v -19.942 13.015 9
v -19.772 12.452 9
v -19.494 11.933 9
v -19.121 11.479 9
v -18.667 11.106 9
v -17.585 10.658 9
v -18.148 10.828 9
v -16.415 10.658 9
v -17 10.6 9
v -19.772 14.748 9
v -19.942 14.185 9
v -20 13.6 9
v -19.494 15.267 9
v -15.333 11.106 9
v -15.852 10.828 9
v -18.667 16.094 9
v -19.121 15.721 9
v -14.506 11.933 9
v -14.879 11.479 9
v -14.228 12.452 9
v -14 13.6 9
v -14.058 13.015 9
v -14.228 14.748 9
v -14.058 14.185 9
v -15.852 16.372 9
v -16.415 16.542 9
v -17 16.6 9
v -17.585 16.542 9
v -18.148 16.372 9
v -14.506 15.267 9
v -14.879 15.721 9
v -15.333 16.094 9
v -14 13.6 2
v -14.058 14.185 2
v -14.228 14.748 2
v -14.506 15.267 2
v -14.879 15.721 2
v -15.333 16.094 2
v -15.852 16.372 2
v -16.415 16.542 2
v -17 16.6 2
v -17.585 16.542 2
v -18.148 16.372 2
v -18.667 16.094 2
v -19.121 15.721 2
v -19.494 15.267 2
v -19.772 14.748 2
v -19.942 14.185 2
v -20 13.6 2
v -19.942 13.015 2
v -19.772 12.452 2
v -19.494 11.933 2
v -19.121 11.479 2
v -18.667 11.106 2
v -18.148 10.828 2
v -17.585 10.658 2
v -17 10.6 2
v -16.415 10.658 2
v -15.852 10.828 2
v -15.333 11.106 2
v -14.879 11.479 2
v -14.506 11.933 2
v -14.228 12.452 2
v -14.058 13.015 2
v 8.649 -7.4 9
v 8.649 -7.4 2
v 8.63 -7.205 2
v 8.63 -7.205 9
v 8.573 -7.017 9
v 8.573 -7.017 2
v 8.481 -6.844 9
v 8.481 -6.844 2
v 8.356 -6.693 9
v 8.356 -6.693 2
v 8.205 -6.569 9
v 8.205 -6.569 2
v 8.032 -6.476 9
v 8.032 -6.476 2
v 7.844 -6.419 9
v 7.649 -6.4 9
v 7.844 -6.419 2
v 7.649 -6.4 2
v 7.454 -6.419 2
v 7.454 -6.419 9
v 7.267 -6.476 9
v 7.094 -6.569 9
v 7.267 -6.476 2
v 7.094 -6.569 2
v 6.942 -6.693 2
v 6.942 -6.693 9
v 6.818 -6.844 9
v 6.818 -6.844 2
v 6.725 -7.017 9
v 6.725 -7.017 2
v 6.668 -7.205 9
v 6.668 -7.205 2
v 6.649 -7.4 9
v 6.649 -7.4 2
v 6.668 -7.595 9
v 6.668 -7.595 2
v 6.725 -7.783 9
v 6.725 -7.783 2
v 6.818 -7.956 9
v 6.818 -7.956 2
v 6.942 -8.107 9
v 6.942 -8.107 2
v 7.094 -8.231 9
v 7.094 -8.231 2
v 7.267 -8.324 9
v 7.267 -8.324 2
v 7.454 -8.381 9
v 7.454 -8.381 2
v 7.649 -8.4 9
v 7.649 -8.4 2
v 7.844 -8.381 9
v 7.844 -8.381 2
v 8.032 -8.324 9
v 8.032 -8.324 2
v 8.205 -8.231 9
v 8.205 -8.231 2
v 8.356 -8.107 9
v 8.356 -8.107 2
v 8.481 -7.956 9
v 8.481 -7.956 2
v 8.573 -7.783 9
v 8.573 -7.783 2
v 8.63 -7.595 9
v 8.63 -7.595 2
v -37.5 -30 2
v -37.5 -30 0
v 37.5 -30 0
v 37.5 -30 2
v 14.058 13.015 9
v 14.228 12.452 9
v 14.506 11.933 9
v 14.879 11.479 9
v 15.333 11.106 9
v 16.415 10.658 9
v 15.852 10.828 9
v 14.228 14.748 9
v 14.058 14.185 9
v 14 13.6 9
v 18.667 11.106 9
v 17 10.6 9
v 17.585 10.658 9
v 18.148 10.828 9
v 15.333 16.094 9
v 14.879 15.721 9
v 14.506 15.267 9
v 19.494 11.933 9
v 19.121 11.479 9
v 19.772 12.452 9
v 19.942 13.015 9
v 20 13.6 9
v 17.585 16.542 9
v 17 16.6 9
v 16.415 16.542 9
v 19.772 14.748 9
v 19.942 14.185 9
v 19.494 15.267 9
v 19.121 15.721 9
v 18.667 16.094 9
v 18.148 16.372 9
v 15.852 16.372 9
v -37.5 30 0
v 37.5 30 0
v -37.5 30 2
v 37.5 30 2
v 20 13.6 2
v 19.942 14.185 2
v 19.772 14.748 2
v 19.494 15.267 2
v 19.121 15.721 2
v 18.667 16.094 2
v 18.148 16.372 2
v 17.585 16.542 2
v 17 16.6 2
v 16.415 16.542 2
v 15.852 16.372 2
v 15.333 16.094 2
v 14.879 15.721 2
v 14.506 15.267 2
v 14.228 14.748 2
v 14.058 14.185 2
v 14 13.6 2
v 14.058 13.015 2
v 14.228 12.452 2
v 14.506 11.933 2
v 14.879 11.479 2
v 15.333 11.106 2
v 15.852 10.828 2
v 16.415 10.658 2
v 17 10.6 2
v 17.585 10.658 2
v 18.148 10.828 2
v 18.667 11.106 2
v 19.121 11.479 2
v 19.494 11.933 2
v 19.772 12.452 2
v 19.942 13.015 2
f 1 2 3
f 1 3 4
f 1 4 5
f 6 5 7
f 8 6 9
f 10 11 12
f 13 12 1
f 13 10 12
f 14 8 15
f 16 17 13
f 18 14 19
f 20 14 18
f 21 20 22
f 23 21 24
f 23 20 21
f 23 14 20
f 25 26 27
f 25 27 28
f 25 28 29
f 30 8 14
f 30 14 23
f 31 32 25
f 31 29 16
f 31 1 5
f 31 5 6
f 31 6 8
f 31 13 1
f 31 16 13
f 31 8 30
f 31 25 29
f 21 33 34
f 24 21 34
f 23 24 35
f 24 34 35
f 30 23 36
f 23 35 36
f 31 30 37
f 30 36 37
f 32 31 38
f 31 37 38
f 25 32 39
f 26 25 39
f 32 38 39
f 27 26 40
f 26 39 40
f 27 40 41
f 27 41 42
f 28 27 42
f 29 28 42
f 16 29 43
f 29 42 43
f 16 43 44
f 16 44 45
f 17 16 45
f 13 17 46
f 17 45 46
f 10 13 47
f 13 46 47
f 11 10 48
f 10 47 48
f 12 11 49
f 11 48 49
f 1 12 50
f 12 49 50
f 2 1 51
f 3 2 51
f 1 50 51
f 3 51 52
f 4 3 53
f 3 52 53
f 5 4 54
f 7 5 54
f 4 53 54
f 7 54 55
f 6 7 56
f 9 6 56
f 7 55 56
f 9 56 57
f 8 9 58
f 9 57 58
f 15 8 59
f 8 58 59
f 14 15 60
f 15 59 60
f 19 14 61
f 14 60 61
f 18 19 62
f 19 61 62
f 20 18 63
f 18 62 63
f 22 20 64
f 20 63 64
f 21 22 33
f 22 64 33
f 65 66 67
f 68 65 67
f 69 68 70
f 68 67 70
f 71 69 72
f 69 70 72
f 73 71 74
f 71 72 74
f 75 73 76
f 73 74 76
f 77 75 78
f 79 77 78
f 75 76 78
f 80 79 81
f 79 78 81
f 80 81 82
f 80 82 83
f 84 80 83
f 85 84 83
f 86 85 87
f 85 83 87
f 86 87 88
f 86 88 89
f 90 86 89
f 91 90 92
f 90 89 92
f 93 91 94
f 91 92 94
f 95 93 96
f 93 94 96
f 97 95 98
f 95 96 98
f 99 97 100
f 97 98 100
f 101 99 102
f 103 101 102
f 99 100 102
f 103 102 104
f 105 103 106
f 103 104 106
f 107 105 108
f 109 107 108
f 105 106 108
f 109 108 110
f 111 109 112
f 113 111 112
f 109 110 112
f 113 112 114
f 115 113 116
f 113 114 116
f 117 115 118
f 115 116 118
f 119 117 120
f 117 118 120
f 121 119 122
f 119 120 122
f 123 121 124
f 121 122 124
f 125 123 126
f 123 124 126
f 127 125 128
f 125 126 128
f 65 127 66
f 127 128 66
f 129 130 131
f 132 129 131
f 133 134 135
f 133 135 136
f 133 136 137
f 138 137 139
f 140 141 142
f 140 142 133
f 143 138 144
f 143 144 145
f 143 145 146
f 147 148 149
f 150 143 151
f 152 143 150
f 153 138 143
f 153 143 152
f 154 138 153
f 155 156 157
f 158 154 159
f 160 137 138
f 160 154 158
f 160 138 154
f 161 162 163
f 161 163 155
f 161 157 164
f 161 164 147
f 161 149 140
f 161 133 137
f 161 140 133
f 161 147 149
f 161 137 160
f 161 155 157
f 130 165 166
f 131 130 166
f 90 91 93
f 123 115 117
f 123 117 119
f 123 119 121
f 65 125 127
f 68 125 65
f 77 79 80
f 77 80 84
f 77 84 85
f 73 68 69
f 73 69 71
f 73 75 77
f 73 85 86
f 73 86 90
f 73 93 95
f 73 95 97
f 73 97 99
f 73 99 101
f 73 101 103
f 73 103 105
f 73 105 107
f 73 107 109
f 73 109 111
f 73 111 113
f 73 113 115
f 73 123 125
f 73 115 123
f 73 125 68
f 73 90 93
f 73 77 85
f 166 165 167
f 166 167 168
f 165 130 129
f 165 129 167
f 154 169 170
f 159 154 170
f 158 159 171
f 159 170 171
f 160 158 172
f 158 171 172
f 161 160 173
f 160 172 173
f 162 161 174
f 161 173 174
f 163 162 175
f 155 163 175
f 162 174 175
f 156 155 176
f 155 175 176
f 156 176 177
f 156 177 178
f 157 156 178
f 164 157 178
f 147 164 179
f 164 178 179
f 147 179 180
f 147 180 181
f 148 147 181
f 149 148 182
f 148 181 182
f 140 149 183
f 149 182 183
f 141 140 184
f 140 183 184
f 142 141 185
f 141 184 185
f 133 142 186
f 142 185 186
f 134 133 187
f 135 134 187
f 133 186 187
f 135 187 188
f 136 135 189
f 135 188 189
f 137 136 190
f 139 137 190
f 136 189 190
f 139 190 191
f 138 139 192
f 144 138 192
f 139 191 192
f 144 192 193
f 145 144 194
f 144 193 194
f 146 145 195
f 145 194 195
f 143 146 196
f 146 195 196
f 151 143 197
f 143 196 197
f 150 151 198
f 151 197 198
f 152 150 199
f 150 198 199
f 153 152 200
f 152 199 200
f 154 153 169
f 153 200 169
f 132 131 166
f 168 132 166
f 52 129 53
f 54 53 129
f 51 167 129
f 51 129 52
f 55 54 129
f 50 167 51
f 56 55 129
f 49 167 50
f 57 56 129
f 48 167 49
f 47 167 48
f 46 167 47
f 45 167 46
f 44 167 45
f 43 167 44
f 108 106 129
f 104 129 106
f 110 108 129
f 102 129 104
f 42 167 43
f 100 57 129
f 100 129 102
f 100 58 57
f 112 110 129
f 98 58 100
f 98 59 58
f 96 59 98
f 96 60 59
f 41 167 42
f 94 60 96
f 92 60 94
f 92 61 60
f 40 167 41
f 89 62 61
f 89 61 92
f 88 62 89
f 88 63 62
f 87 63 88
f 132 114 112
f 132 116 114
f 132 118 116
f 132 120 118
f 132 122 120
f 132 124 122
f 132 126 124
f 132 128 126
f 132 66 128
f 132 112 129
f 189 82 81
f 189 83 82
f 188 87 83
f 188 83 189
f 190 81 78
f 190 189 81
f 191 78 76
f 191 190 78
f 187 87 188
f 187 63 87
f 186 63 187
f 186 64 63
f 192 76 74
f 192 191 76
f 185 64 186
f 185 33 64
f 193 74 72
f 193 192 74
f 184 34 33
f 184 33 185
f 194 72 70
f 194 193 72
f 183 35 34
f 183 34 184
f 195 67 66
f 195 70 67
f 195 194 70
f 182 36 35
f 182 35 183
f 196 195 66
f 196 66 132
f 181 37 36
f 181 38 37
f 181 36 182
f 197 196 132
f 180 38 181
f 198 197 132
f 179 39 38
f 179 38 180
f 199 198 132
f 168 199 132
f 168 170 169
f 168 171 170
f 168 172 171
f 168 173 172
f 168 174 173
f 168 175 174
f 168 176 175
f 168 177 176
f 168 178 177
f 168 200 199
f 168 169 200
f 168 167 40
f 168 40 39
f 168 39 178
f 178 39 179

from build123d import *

# Parameters (mm, degrees)
ESQUISSE3_W        = 75
ESQUISSE3_H        = 60
BOSS_EXTRU_4_DEPTH = 2
ESQUISSE7_R        = 3
ESQUISSE7_R_2      = 1
BOSS_EXTRU_5_DEPTH = 7


with BuildPart() as part:
    # Esquisse3 → Boss.-Extru.4 (new body)
    with BuildSketch(Plane.XY):
        Rectangle(ESQUISSE3_W, ESQUISSE3_H)
    extrude(amount=BOSS_EXTRU_4_DEPTH)

    # Esquisse7 → Boss.-Extru.5 (add)
    with BuildSketch(Plane.XY.offset(2)):
        with Locations((-17, 13.6)):
            Circle(ESQUISSE7_R)
        with Locations((17, 13.6)):
            Circle(ESQUISSE7_R)
        with Locations((7.649218941, -7.4)):
            Circle(ESQUISSE7_R_2)
    extrude(amount=BOSS_EXTRU_5_DEPTH)


solid = part.part
